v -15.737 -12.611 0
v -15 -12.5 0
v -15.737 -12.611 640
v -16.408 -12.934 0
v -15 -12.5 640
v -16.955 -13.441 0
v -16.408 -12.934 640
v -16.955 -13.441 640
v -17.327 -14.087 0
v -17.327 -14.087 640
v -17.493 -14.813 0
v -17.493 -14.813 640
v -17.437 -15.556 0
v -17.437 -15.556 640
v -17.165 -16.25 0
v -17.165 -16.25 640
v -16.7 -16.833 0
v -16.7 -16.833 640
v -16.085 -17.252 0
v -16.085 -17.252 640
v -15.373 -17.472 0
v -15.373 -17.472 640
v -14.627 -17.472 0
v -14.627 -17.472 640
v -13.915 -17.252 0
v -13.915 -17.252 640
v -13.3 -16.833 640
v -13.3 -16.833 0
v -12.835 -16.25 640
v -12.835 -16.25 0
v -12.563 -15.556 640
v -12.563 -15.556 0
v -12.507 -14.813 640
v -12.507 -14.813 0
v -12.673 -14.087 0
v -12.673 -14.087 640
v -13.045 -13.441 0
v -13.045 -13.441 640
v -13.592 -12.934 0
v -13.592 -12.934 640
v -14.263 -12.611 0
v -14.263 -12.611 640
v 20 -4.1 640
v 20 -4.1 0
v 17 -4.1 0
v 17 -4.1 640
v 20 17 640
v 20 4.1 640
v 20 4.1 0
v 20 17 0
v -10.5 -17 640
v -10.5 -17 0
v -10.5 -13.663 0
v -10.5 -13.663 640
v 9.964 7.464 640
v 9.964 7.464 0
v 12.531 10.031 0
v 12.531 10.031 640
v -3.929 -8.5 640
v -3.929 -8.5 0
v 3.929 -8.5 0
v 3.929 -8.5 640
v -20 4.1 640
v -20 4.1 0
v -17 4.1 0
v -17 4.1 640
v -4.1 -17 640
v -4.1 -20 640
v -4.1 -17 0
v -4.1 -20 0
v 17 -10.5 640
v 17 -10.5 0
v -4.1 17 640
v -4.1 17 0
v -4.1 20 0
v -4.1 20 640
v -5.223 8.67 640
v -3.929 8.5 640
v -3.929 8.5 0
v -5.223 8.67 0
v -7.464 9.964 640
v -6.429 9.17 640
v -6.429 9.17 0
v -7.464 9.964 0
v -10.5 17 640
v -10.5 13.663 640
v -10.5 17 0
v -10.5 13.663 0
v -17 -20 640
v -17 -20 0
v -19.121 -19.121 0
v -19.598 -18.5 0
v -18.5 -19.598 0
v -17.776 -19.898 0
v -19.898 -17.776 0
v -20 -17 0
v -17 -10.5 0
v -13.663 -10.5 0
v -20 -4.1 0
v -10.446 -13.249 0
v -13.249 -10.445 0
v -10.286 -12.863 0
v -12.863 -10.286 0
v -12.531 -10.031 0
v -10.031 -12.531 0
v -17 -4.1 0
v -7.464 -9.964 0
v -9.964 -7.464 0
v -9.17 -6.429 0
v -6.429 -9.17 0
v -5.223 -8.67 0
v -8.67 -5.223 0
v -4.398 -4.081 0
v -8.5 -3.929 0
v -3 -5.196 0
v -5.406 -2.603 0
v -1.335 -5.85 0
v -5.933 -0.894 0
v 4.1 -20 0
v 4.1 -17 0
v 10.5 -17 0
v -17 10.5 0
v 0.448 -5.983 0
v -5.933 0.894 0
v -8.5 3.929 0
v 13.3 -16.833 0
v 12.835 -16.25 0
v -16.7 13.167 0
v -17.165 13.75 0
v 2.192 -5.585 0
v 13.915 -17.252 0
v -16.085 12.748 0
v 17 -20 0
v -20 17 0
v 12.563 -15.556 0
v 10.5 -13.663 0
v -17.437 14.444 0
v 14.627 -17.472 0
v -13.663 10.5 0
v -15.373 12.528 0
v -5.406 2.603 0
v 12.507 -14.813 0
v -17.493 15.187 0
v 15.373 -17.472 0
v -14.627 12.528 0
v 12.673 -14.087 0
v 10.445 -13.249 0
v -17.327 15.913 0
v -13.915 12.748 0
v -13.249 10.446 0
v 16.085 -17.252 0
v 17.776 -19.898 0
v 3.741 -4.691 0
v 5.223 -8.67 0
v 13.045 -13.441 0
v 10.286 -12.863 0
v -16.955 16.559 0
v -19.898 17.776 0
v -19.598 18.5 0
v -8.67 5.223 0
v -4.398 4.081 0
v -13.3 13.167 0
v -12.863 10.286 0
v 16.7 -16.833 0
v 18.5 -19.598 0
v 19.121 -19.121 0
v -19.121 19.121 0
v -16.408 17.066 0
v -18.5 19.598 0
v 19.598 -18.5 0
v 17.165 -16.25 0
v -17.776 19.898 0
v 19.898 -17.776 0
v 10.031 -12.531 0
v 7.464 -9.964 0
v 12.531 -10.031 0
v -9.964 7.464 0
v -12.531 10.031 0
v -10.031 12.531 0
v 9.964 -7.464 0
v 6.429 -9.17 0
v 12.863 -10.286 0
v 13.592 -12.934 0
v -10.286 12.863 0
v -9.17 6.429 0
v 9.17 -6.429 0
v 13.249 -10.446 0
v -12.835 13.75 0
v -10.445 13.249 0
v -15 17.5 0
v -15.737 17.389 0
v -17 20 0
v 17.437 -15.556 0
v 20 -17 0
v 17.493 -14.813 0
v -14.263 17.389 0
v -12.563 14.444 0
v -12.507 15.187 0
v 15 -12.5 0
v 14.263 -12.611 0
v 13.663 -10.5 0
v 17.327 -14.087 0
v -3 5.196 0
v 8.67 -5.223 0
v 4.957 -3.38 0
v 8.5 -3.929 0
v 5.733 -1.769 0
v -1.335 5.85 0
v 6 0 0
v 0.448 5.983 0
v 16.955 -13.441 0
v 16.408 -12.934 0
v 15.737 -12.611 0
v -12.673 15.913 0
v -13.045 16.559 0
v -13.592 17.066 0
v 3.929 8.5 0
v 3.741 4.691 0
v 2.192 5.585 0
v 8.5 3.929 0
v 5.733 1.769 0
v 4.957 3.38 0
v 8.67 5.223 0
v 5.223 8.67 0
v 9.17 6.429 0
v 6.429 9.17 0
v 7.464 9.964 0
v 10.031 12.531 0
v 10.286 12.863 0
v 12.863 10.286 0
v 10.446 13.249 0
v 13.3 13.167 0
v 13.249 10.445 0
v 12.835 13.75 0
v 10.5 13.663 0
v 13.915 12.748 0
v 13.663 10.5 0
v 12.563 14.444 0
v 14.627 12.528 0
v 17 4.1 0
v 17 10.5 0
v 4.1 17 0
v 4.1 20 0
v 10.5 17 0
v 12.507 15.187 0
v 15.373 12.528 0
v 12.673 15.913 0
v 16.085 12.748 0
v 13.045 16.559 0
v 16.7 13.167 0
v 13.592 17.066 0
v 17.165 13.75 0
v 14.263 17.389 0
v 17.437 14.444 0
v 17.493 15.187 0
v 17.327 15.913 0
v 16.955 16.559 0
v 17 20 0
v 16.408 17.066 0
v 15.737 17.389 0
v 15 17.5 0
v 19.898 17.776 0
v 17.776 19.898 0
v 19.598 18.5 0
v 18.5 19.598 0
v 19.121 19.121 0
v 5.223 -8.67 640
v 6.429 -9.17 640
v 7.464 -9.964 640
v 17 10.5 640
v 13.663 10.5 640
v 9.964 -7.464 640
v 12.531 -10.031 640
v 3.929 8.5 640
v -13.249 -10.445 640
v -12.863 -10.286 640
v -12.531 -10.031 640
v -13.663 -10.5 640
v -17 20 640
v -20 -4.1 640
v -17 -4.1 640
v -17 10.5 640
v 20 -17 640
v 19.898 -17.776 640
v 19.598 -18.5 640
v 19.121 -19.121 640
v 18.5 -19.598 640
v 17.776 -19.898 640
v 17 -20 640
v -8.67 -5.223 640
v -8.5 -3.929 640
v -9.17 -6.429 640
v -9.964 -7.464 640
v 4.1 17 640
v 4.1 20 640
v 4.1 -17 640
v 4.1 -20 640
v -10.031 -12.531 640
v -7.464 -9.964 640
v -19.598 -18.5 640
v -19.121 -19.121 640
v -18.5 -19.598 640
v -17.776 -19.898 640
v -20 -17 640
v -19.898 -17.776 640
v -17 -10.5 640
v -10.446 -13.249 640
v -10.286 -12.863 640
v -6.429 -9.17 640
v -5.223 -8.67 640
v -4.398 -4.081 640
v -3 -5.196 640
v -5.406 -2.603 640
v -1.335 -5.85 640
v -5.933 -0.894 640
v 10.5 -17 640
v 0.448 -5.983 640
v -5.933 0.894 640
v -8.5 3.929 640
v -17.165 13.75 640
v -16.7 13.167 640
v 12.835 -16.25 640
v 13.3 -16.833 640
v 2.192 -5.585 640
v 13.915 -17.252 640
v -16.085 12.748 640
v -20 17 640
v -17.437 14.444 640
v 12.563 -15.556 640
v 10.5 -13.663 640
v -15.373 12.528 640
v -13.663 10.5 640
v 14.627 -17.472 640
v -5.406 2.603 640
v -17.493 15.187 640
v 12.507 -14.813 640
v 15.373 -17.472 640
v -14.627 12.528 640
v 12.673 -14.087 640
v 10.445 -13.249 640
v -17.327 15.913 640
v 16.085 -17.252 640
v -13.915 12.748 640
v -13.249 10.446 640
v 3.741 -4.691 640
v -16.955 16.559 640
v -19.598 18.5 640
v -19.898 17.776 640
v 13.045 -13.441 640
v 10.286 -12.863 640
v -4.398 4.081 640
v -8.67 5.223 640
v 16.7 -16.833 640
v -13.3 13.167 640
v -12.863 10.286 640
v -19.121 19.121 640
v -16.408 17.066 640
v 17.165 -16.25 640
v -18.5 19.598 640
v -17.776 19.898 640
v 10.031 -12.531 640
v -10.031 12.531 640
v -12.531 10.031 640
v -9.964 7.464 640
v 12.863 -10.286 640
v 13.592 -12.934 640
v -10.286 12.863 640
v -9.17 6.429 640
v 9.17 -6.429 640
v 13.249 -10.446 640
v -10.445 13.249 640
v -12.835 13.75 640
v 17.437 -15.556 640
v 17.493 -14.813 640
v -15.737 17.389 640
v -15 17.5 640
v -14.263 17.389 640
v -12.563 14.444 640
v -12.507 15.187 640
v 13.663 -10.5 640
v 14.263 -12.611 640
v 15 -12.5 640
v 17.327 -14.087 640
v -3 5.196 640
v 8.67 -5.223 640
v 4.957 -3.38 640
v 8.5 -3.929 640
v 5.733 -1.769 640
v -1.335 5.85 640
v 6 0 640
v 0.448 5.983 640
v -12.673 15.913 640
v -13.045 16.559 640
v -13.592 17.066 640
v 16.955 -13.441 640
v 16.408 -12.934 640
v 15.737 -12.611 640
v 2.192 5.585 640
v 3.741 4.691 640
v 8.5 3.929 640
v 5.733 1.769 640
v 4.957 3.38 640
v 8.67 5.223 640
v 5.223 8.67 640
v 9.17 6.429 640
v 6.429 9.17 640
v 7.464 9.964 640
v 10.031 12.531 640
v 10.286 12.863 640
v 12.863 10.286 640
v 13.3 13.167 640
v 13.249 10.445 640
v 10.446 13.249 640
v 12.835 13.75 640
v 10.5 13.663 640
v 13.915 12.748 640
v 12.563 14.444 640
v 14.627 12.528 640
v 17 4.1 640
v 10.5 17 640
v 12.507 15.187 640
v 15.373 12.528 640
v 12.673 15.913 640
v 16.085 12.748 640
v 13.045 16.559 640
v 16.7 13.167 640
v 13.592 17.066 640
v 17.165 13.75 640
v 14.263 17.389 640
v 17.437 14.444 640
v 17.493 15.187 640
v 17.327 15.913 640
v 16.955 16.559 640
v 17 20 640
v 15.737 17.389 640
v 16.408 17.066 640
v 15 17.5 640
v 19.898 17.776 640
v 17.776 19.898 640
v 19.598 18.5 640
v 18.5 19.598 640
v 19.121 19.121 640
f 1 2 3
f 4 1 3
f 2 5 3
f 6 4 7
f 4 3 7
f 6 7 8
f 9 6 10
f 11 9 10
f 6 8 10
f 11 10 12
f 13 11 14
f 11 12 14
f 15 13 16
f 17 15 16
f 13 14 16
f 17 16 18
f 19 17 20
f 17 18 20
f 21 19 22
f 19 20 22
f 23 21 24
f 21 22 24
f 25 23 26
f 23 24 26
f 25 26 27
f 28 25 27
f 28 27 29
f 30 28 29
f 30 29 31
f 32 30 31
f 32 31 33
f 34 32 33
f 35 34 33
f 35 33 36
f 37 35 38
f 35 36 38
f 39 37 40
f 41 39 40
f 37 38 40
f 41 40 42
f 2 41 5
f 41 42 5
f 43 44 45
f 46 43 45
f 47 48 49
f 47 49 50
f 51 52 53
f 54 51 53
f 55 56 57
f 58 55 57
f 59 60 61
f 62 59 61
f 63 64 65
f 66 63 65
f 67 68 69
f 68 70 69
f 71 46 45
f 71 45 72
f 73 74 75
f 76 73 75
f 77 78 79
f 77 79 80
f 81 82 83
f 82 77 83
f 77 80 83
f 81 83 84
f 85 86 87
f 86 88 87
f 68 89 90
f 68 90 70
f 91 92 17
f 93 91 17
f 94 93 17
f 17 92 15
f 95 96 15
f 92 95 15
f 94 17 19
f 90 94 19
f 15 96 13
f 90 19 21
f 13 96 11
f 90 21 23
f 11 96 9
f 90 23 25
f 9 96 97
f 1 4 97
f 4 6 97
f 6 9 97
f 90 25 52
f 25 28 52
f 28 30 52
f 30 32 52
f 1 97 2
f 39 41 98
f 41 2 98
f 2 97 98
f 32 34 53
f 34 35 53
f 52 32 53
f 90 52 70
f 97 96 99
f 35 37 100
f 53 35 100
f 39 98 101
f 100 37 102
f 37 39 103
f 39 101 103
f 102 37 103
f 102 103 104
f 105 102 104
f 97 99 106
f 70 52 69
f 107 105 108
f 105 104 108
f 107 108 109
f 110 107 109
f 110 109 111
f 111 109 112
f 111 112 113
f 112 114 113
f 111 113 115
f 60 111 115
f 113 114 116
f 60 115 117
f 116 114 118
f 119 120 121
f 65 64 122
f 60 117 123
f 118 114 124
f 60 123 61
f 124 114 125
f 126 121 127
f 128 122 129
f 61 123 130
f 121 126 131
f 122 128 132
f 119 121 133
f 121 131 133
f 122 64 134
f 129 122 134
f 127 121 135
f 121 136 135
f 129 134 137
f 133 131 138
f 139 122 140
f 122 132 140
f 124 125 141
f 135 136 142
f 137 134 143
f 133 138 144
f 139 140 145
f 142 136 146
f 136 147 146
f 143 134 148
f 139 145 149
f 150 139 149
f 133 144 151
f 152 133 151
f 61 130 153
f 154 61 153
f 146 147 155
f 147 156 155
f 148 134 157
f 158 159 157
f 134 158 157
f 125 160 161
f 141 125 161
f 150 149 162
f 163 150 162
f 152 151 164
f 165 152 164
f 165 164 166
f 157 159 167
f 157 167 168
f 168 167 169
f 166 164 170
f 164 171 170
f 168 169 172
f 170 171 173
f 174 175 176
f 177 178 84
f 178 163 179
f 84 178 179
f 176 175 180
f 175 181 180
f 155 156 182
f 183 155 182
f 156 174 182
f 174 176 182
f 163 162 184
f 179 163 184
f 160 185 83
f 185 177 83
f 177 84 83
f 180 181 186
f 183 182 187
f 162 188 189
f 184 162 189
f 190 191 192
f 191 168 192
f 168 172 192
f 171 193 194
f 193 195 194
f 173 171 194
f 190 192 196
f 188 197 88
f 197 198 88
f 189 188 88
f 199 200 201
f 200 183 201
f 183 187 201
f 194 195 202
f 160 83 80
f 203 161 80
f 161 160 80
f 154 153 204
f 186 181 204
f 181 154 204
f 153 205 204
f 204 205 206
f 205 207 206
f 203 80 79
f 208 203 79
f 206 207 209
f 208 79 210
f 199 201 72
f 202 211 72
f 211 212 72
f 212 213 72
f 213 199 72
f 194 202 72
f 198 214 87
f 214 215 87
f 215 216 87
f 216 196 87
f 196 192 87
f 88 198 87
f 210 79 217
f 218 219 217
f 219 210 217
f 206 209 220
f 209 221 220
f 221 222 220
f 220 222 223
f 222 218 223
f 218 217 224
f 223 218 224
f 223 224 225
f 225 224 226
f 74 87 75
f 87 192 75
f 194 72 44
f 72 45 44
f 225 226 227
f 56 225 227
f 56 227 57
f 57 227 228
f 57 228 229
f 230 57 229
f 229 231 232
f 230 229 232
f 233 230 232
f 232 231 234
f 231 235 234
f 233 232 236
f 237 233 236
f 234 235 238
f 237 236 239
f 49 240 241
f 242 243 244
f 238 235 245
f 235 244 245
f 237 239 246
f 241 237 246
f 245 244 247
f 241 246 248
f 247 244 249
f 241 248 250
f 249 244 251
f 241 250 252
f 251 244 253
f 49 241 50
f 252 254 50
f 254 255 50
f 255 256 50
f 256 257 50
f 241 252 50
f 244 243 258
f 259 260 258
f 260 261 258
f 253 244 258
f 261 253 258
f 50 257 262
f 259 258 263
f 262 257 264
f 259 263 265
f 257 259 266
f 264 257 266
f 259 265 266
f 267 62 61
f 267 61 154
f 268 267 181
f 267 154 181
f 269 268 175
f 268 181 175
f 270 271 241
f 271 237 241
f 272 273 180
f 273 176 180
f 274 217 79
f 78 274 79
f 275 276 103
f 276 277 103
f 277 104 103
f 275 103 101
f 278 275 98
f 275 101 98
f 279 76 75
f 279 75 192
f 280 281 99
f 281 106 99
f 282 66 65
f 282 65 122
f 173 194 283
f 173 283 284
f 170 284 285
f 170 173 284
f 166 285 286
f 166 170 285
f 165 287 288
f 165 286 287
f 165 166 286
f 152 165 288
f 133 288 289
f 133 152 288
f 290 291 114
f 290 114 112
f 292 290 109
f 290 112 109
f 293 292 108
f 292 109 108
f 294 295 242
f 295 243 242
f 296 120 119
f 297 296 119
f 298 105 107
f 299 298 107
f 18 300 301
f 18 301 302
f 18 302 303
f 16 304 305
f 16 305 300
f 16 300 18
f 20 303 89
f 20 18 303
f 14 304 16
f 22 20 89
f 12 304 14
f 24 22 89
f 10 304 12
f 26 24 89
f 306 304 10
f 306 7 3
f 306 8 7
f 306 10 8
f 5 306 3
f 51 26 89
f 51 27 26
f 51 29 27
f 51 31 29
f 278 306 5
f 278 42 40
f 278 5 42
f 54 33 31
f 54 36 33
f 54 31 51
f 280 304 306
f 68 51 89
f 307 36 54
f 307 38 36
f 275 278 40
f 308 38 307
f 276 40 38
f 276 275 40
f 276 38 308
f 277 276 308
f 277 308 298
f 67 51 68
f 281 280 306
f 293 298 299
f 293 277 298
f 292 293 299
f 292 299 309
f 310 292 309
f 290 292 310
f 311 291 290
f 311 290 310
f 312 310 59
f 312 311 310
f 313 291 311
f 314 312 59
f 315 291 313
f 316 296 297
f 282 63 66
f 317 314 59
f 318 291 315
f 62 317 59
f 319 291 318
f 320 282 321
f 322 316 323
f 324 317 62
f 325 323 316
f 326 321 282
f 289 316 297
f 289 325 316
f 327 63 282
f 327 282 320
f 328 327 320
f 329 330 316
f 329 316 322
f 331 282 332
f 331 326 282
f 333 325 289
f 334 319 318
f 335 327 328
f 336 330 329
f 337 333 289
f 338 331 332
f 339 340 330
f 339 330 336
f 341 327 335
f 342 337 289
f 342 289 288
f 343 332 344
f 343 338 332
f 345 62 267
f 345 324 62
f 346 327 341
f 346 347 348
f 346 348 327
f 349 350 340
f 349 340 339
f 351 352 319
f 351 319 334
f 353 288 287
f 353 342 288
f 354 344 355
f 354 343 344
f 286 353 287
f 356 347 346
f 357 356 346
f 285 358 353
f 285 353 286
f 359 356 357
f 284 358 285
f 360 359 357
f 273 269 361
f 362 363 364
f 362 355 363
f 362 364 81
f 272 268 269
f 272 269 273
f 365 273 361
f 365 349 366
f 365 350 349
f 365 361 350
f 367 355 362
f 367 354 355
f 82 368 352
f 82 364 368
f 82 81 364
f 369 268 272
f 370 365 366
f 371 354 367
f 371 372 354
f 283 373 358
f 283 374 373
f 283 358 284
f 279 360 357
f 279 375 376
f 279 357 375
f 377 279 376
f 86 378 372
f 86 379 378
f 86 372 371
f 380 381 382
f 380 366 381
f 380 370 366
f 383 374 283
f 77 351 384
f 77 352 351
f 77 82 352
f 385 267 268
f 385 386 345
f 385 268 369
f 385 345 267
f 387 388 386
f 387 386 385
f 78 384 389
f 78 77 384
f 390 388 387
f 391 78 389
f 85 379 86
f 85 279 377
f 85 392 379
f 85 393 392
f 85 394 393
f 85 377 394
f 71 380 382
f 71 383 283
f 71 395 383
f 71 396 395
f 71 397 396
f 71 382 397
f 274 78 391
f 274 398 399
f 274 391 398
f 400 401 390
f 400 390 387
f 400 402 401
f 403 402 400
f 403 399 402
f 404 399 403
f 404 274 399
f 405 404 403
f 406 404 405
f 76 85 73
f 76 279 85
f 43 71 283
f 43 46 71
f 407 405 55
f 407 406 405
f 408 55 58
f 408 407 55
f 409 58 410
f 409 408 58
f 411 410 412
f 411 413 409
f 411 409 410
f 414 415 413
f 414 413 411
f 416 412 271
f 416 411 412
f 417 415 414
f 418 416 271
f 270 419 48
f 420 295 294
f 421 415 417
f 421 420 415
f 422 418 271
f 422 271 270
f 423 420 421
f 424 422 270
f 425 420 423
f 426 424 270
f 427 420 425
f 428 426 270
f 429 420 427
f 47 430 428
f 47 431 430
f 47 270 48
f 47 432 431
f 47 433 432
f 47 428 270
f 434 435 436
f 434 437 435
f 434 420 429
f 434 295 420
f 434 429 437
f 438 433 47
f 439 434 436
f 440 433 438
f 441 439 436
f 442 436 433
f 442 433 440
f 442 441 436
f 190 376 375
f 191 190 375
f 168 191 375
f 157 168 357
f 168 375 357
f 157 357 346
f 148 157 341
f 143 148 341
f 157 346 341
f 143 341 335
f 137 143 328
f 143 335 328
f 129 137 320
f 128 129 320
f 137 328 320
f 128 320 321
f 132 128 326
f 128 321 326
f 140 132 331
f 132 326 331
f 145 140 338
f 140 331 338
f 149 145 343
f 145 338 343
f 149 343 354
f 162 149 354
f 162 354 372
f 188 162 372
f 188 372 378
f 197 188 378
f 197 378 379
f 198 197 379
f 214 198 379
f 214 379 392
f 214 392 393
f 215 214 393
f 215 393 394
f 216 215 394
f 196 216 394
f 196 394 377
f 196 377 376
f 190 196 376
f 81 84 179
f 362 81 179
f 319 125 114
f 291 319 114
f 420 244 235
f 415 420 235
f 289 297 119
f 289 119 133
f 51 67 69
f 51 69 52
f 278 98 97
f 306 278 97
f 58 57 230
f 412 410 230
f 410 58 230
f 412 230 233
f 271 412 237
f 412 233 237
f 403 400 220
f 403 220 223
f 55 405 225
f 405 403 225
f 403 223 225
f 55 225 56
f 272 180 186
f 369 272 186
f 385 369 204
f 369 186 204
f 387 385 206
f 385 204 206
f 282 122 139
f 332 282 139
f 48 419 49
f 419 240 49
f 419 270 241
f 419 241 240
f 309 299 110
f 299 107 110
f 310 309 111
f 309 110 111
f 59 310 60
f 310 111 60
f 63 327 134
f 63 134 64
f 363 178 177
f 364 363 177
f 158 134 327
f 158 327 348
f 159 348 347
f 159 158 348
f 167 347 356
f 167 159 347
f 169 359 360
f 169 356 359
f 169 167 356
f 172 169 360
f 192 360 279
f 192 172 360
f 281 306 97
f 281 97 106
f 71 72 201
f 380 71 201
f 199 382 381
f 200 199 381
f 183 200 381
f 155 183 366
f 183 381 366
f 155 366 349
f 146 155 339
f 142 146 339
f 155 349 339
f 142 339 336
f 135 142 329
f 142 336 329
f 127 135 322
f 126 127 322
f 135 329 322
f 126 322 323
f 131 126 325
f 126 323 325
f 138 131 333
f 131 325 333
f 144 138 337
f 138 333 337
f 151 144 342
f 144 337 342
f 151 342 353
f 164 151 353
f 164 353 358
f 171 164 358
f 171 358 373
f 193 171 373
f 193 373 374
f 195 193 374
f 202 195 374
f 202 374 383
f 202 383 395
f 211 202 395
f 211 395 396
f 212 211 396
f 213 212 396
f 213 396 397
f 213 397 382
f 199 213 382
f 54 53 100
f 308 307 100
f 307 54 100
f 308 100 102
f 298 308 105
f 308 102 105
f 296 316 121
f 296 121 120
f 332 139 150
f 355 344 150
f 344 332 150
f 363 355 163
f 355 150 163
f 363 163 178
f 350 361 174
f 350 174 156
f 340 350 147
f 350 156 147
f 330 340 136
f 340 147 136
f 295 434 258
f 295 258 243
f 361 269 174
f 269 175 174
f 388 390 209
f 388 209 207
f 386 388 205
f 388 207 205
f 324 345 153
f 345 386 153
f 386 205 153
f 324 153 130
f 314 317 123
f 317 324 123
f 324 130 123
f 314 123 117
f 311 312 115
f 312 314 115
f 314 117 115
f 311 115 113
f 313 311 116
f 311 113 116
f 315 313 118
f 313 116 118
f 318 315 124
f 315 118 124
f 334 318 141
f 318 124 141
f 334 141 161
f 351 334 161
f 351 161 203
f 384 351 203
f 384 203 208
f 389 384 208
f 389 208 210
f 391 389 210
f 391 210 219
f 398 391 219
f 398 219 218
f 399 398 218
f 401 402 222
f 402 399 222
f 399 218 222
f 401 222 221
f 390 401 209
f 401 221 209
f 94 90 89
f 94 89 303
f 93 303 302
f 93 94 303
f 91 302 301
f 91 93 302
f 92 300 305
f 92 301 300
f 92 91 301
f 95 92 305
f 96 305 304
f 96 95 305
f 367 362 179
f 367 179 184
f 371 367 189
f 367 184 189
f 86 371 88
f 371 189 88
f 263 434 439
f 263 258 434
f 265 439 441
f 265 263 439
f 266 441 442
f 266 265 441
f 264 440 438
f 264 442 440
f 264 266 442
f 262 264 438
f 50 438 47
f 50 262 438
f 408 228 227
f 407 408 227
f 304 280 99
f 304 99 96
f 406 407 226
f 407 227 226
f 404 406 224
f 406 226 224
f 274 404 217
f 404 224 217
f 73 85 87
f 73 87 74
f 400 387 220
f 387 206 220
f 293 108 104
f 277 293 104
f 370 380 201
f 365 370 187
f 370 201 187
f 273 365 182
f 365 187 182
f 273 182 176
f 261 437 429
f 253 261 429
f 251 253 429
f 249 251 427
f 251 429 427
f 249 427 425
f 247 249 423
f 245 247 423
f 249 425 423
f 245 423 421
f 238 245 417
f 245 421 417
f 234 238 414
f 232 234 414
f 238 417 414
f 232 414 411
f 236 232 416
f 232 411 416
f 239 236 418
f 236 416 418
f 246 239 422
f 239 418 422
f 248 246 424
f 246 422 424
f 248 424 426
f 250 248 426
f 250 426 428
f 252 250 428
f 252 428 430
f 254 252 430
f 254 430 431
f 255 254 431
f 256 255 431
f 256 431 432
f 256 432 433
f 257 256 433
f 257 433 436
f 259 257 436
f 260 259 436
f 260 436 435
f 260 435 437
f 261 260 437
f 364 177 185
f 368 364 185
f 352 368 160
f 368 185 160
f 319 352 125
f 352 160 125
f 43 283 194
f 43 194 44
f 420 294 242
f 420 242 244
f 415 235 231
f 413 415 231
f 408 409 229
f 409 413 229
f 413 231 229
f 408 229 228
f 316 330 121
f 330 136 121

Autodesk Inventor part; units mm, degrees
sketch "Skizze_1" plane through (0, 0, 0) normal (0, 0, 1) x (1, 0, 0)
  arc A0 (-20, -17) -> (-17, -20) centre (-17, -17) ccw
  line L0 (-17, -20) -> (-4.1, -20)
  line L1 (-4.1, -20) -> (-4.1, -17)
  line L2 (-4.1, -17) -> (-10.5, -17)
  line L3 (-10.5, -17) -> (-10.5, -13.6627)
  arc A1 (-10.0314, -12.5314) -> (-10.5, -13.6627) centre (-8.9002, -13.6627) ccw
  line L4 (-10.0314, -12.5314) -> (-7.4645, -9.9645)
  arc A2 (-3.9289, -8.5) -> (-7.4645, -9.9645) centre (-3.9289, -13.5) ccw
  line L5 (-3.9289, -8.5) -> (3.9289, -8.5)
  arc A3 (7.4645, -9.9645) -> (3.9289, -8.5) centre (3.9289, -13.5) ccw
  line L6 (7.4645, -9.9645) -> (10.0314, -12.5314)
  arc A4 (10.5, -13.6627) -> (10.0314, -12.5314) centre (8.9002, -13.6627) ccw
  line L7 (10.5, -13.6627) -> (10.5, -17)
  line L8 (10.5, -17) -> (4.1, -17)
  line L9 (4.1, -17) -> (4.1, -20)
  line L10 (4.1, -20) -> (17, -20)
  arc A5 (17, -20) -> (20, -17) centre (17, -17) ccw
  line L11 (20, -17) -> (20, -4.1)
  line L12 (20, -4.1) -> (17, -4.1)
  line L13 (17, -4.1) -> (17, -10.5)
  line L14 (17, -10.5) -> (13.6627, -10.5)
  arc A6 (12.5314, -10.0314) -> (13.6627, -10.5) centre (13.6627, -8.9002) ccw
  line L15 (12.5314, -10.0314) -> (9.9645, -7.4645)
  arc A7 (8.5, -3.9289) -> (9.9645, -7.4645) centre (13.5, -3.9289) ccw
  line L16 (8.5, -3.9289) -> (8.5, 3.9289)
  arc A8 (9.9645, 7.4645) -> (8.5, 3.9289) centre (13.5, 3.9289) ccw
  line L17 (9.9645, 7.4645) -> (12.5314, 10.0314)
  arc A9 (13.6627, 10.5) -> (12.5314, 10.0314) centre (13.6627, 8.9002) ccw
  line L18 (13.6627, 10.5) -> (17, 10.5)
  line L19 (17, 10.5) -> (17, 4.1)
  line L20 (17, 4.1) -> (20, 4.1)
  line L21 (20, 4.1) -> (20, 17)
  arc A10 (20, 17) -> (17, 20) centre (17, 17) ccw
  line L22 (17, 20) -> (4.1, 20)
  line L23 (4.1, 20) -> (4.1, 17)
  line L24 (4.1, 17) -> (10.5, 17)
  line L25 (10.5, 17) -> (10.5, 13.6627)
  arc A11 (10.0314, 12.5314) -> (10.5, 13.6627) centre (8.9002, 13.6627) ccw
  line L26 (10.0314, 12.5314) -> (7.4645, 9.9645)
  arc A12 (3.9289, 8.5) -> (7.4645, 9.9645) centre (3.9289, 13.5) ccw
  line L27 (3.9289, 8.5) -> (-3.9289, 8.5)
  arc A13 (-7.4645, 9.9645) -> (-3.9289, 8.5) centre (-3.9289, 13.5) ccw
  line L28 (-7.4645, 9.9645) -> (-10.0314, 12.5314)
  arc A14 (-10.5, 13.6627) -> (-10.0314, 12.5314) centre (-8.9002, 13.6627) ccw
  line L29 (-10.5, 13.6627) -> (-10.5, 17)
  line L30 (-10.5, 17) -> (-4.1, 17)
  line L31 (-4.1, 17) -> (-4.1, 20)
  line L32 (-4.1, 20) -> (-17, 20)
  arc A15 (-17, 20) -> (-20, 17) centre (-17, 17) ccw
  line L33 (-20, 17) -> (-20, 4.1)
  line L34 (-20, 4.1) -> (-17, 4.1)
  line L35 (-17, 4.1) -> (-17, 10.5)
  line L36 (-17, 10.5) -> (-13.6627, 10.5)
  arc A16 (-12.5314, 10.0314) -> (-13.6627, 10.5) centre (-13.6627, 8.9002) ccw
  line L37 (-12.5314, 10.0314) -> (-9.9645, 7.4645)
  arc A17 (-8.5, 3.9289) -> (-9.9645, 7.4645) centre (-13.5, 3.9289) ccw
  line L38 (-8.5, 3.9289) -> (-8.5, -3.9289)
  arc A18 (-9.9645, -7.4645) -> (-8.5, -3.9289) centre (-13.5, -3.9289) ccw
  line L39 (-9.9645, -7.4645) -> (-12.5314, -10.0314)
  arc A19 (-13.6627, -10.5) -> (-12.5314, -10.0314) centre (-13.6627, -8.9002) ccw
  line L40 (-13.6627, -10.5) -> (-17, -10.5)
  line L41 (-17, -10.5) -> (-17, -4.1)
  line L42 (-17, -4.1) -> (-20, -4.1)
  line L43 (-20, -4.1) -> (-20, -17)
  circle A20 centre (0, 0) radius 6
extrude "Extrusion1" add sketch "Skizze_1" along normal blind 640
sketch "Sketch2" plane through (0, 0, 0) normal (0, 0, -1) x (1, 0, 0)
  point P0 (-15, -15)
hole "Drilling 1" at (-15, 15, 0) direction (0, 0, 1) diameter 5 depth 6000
sketch "Sketch3" plane through (0, 0, 0) normal (0, 0, -1) x (1, 0, 0)
  point P0 (15, -15)
hole "Drilling 2" at (15, 15, 0) direction (0, 0, 1) diameter 5 depth 6000
sketch "Sketch4" plane through (0, 0, 0) normal (0, 0, -1) x (1, 0, 0)
  point P0 (15, 15)
hole "Drilling 3" at (15, -15, 0) direction (0, 0, 1) diameter 5 depth 6000
sketch "Sketch5" plane through (0, 0, 0) normal (0, 0, -1) x (1, 0, 0)
  point P0 (-15, 15)
hole "Drilling 4" at (-15, -15, 0) direction (0, 0, 1) diameter 5 depth 6000
ref_plane "side_4d_XY" through (-20, 0, -330) normal (-1, 0, 0) x (0, 1, 0)
ref_plane "side_4d_YZ" through (-20, 0, -330) normal (0, 1, 0) x (0, 0, -1)
ref_plane "side_4d_ZX" through (-20, 0, -330) normal (0, 0, -1) x (-1, 0, 0)
ref_plane "side_1a_XY" through (0, 20, -330) normal (0, 1, 0) x (1, 0, 0)
ref_plane "side_1a_YZ" through (0, 20, -330) normal (1, 0, 0) x (0, 0, -1)
ref_plane "side_1a_ZX" through (0, 20, -330) normal (0, 0, -1) x (0, 1, 0)
ref_plane "side_2b_XY" through (20, 0, -330) normal (1, 0, 0) x (0, -1, 0)
ref_plane "side_2b_YZ" through (20, 0, -330) normal (0, -1, 0) x (0, 0, -1)
ref_plane "side_2b_ZX" through (20, 0, -330) normal (0, 0, -1) x (1, 0, 0)
ref_plane "side_3c_XY" through (0, -20, -330) normal (0, -1, 0) x (-1, 0, 0)
ref_plane "side_3c_YZ" through (0, -20, -330) normal (-1, 0, 0) x (0, 0, -1)
ref_plane "side_3c_ZX" through (0, -20, -330) normal (0, 0, -1) x (0, -1, 0)
ref_plane "end_XY" through (0, 0, -660) normal (0, 0, -1) x (1, 0, 0)
ref_plane "end_YZ" through (0, 0, -660) normal (1, 0, 0) x (0, -1, 0)
ref_plane "end_ZX" through (0, 0, -660) normal (0, -1, 0) x (0, 0, -1)
ref_plane "start_XY" through (0, 0, 0) normal (0, 0, 1) x (1, 0, 0)
ref_plane "start_YZ" through (0, 0, 0) normal (1, 0, 0) x (0, 1, 0)
ref_plane "start_ZX" through (0, 0, 0) normal (0, 1, 0) x (0, 0, 1)
properties part number "MayTec 1.11.040040.43S_Profile 40x40, 4E, S_660_Detail_(0;0,0,0)"
